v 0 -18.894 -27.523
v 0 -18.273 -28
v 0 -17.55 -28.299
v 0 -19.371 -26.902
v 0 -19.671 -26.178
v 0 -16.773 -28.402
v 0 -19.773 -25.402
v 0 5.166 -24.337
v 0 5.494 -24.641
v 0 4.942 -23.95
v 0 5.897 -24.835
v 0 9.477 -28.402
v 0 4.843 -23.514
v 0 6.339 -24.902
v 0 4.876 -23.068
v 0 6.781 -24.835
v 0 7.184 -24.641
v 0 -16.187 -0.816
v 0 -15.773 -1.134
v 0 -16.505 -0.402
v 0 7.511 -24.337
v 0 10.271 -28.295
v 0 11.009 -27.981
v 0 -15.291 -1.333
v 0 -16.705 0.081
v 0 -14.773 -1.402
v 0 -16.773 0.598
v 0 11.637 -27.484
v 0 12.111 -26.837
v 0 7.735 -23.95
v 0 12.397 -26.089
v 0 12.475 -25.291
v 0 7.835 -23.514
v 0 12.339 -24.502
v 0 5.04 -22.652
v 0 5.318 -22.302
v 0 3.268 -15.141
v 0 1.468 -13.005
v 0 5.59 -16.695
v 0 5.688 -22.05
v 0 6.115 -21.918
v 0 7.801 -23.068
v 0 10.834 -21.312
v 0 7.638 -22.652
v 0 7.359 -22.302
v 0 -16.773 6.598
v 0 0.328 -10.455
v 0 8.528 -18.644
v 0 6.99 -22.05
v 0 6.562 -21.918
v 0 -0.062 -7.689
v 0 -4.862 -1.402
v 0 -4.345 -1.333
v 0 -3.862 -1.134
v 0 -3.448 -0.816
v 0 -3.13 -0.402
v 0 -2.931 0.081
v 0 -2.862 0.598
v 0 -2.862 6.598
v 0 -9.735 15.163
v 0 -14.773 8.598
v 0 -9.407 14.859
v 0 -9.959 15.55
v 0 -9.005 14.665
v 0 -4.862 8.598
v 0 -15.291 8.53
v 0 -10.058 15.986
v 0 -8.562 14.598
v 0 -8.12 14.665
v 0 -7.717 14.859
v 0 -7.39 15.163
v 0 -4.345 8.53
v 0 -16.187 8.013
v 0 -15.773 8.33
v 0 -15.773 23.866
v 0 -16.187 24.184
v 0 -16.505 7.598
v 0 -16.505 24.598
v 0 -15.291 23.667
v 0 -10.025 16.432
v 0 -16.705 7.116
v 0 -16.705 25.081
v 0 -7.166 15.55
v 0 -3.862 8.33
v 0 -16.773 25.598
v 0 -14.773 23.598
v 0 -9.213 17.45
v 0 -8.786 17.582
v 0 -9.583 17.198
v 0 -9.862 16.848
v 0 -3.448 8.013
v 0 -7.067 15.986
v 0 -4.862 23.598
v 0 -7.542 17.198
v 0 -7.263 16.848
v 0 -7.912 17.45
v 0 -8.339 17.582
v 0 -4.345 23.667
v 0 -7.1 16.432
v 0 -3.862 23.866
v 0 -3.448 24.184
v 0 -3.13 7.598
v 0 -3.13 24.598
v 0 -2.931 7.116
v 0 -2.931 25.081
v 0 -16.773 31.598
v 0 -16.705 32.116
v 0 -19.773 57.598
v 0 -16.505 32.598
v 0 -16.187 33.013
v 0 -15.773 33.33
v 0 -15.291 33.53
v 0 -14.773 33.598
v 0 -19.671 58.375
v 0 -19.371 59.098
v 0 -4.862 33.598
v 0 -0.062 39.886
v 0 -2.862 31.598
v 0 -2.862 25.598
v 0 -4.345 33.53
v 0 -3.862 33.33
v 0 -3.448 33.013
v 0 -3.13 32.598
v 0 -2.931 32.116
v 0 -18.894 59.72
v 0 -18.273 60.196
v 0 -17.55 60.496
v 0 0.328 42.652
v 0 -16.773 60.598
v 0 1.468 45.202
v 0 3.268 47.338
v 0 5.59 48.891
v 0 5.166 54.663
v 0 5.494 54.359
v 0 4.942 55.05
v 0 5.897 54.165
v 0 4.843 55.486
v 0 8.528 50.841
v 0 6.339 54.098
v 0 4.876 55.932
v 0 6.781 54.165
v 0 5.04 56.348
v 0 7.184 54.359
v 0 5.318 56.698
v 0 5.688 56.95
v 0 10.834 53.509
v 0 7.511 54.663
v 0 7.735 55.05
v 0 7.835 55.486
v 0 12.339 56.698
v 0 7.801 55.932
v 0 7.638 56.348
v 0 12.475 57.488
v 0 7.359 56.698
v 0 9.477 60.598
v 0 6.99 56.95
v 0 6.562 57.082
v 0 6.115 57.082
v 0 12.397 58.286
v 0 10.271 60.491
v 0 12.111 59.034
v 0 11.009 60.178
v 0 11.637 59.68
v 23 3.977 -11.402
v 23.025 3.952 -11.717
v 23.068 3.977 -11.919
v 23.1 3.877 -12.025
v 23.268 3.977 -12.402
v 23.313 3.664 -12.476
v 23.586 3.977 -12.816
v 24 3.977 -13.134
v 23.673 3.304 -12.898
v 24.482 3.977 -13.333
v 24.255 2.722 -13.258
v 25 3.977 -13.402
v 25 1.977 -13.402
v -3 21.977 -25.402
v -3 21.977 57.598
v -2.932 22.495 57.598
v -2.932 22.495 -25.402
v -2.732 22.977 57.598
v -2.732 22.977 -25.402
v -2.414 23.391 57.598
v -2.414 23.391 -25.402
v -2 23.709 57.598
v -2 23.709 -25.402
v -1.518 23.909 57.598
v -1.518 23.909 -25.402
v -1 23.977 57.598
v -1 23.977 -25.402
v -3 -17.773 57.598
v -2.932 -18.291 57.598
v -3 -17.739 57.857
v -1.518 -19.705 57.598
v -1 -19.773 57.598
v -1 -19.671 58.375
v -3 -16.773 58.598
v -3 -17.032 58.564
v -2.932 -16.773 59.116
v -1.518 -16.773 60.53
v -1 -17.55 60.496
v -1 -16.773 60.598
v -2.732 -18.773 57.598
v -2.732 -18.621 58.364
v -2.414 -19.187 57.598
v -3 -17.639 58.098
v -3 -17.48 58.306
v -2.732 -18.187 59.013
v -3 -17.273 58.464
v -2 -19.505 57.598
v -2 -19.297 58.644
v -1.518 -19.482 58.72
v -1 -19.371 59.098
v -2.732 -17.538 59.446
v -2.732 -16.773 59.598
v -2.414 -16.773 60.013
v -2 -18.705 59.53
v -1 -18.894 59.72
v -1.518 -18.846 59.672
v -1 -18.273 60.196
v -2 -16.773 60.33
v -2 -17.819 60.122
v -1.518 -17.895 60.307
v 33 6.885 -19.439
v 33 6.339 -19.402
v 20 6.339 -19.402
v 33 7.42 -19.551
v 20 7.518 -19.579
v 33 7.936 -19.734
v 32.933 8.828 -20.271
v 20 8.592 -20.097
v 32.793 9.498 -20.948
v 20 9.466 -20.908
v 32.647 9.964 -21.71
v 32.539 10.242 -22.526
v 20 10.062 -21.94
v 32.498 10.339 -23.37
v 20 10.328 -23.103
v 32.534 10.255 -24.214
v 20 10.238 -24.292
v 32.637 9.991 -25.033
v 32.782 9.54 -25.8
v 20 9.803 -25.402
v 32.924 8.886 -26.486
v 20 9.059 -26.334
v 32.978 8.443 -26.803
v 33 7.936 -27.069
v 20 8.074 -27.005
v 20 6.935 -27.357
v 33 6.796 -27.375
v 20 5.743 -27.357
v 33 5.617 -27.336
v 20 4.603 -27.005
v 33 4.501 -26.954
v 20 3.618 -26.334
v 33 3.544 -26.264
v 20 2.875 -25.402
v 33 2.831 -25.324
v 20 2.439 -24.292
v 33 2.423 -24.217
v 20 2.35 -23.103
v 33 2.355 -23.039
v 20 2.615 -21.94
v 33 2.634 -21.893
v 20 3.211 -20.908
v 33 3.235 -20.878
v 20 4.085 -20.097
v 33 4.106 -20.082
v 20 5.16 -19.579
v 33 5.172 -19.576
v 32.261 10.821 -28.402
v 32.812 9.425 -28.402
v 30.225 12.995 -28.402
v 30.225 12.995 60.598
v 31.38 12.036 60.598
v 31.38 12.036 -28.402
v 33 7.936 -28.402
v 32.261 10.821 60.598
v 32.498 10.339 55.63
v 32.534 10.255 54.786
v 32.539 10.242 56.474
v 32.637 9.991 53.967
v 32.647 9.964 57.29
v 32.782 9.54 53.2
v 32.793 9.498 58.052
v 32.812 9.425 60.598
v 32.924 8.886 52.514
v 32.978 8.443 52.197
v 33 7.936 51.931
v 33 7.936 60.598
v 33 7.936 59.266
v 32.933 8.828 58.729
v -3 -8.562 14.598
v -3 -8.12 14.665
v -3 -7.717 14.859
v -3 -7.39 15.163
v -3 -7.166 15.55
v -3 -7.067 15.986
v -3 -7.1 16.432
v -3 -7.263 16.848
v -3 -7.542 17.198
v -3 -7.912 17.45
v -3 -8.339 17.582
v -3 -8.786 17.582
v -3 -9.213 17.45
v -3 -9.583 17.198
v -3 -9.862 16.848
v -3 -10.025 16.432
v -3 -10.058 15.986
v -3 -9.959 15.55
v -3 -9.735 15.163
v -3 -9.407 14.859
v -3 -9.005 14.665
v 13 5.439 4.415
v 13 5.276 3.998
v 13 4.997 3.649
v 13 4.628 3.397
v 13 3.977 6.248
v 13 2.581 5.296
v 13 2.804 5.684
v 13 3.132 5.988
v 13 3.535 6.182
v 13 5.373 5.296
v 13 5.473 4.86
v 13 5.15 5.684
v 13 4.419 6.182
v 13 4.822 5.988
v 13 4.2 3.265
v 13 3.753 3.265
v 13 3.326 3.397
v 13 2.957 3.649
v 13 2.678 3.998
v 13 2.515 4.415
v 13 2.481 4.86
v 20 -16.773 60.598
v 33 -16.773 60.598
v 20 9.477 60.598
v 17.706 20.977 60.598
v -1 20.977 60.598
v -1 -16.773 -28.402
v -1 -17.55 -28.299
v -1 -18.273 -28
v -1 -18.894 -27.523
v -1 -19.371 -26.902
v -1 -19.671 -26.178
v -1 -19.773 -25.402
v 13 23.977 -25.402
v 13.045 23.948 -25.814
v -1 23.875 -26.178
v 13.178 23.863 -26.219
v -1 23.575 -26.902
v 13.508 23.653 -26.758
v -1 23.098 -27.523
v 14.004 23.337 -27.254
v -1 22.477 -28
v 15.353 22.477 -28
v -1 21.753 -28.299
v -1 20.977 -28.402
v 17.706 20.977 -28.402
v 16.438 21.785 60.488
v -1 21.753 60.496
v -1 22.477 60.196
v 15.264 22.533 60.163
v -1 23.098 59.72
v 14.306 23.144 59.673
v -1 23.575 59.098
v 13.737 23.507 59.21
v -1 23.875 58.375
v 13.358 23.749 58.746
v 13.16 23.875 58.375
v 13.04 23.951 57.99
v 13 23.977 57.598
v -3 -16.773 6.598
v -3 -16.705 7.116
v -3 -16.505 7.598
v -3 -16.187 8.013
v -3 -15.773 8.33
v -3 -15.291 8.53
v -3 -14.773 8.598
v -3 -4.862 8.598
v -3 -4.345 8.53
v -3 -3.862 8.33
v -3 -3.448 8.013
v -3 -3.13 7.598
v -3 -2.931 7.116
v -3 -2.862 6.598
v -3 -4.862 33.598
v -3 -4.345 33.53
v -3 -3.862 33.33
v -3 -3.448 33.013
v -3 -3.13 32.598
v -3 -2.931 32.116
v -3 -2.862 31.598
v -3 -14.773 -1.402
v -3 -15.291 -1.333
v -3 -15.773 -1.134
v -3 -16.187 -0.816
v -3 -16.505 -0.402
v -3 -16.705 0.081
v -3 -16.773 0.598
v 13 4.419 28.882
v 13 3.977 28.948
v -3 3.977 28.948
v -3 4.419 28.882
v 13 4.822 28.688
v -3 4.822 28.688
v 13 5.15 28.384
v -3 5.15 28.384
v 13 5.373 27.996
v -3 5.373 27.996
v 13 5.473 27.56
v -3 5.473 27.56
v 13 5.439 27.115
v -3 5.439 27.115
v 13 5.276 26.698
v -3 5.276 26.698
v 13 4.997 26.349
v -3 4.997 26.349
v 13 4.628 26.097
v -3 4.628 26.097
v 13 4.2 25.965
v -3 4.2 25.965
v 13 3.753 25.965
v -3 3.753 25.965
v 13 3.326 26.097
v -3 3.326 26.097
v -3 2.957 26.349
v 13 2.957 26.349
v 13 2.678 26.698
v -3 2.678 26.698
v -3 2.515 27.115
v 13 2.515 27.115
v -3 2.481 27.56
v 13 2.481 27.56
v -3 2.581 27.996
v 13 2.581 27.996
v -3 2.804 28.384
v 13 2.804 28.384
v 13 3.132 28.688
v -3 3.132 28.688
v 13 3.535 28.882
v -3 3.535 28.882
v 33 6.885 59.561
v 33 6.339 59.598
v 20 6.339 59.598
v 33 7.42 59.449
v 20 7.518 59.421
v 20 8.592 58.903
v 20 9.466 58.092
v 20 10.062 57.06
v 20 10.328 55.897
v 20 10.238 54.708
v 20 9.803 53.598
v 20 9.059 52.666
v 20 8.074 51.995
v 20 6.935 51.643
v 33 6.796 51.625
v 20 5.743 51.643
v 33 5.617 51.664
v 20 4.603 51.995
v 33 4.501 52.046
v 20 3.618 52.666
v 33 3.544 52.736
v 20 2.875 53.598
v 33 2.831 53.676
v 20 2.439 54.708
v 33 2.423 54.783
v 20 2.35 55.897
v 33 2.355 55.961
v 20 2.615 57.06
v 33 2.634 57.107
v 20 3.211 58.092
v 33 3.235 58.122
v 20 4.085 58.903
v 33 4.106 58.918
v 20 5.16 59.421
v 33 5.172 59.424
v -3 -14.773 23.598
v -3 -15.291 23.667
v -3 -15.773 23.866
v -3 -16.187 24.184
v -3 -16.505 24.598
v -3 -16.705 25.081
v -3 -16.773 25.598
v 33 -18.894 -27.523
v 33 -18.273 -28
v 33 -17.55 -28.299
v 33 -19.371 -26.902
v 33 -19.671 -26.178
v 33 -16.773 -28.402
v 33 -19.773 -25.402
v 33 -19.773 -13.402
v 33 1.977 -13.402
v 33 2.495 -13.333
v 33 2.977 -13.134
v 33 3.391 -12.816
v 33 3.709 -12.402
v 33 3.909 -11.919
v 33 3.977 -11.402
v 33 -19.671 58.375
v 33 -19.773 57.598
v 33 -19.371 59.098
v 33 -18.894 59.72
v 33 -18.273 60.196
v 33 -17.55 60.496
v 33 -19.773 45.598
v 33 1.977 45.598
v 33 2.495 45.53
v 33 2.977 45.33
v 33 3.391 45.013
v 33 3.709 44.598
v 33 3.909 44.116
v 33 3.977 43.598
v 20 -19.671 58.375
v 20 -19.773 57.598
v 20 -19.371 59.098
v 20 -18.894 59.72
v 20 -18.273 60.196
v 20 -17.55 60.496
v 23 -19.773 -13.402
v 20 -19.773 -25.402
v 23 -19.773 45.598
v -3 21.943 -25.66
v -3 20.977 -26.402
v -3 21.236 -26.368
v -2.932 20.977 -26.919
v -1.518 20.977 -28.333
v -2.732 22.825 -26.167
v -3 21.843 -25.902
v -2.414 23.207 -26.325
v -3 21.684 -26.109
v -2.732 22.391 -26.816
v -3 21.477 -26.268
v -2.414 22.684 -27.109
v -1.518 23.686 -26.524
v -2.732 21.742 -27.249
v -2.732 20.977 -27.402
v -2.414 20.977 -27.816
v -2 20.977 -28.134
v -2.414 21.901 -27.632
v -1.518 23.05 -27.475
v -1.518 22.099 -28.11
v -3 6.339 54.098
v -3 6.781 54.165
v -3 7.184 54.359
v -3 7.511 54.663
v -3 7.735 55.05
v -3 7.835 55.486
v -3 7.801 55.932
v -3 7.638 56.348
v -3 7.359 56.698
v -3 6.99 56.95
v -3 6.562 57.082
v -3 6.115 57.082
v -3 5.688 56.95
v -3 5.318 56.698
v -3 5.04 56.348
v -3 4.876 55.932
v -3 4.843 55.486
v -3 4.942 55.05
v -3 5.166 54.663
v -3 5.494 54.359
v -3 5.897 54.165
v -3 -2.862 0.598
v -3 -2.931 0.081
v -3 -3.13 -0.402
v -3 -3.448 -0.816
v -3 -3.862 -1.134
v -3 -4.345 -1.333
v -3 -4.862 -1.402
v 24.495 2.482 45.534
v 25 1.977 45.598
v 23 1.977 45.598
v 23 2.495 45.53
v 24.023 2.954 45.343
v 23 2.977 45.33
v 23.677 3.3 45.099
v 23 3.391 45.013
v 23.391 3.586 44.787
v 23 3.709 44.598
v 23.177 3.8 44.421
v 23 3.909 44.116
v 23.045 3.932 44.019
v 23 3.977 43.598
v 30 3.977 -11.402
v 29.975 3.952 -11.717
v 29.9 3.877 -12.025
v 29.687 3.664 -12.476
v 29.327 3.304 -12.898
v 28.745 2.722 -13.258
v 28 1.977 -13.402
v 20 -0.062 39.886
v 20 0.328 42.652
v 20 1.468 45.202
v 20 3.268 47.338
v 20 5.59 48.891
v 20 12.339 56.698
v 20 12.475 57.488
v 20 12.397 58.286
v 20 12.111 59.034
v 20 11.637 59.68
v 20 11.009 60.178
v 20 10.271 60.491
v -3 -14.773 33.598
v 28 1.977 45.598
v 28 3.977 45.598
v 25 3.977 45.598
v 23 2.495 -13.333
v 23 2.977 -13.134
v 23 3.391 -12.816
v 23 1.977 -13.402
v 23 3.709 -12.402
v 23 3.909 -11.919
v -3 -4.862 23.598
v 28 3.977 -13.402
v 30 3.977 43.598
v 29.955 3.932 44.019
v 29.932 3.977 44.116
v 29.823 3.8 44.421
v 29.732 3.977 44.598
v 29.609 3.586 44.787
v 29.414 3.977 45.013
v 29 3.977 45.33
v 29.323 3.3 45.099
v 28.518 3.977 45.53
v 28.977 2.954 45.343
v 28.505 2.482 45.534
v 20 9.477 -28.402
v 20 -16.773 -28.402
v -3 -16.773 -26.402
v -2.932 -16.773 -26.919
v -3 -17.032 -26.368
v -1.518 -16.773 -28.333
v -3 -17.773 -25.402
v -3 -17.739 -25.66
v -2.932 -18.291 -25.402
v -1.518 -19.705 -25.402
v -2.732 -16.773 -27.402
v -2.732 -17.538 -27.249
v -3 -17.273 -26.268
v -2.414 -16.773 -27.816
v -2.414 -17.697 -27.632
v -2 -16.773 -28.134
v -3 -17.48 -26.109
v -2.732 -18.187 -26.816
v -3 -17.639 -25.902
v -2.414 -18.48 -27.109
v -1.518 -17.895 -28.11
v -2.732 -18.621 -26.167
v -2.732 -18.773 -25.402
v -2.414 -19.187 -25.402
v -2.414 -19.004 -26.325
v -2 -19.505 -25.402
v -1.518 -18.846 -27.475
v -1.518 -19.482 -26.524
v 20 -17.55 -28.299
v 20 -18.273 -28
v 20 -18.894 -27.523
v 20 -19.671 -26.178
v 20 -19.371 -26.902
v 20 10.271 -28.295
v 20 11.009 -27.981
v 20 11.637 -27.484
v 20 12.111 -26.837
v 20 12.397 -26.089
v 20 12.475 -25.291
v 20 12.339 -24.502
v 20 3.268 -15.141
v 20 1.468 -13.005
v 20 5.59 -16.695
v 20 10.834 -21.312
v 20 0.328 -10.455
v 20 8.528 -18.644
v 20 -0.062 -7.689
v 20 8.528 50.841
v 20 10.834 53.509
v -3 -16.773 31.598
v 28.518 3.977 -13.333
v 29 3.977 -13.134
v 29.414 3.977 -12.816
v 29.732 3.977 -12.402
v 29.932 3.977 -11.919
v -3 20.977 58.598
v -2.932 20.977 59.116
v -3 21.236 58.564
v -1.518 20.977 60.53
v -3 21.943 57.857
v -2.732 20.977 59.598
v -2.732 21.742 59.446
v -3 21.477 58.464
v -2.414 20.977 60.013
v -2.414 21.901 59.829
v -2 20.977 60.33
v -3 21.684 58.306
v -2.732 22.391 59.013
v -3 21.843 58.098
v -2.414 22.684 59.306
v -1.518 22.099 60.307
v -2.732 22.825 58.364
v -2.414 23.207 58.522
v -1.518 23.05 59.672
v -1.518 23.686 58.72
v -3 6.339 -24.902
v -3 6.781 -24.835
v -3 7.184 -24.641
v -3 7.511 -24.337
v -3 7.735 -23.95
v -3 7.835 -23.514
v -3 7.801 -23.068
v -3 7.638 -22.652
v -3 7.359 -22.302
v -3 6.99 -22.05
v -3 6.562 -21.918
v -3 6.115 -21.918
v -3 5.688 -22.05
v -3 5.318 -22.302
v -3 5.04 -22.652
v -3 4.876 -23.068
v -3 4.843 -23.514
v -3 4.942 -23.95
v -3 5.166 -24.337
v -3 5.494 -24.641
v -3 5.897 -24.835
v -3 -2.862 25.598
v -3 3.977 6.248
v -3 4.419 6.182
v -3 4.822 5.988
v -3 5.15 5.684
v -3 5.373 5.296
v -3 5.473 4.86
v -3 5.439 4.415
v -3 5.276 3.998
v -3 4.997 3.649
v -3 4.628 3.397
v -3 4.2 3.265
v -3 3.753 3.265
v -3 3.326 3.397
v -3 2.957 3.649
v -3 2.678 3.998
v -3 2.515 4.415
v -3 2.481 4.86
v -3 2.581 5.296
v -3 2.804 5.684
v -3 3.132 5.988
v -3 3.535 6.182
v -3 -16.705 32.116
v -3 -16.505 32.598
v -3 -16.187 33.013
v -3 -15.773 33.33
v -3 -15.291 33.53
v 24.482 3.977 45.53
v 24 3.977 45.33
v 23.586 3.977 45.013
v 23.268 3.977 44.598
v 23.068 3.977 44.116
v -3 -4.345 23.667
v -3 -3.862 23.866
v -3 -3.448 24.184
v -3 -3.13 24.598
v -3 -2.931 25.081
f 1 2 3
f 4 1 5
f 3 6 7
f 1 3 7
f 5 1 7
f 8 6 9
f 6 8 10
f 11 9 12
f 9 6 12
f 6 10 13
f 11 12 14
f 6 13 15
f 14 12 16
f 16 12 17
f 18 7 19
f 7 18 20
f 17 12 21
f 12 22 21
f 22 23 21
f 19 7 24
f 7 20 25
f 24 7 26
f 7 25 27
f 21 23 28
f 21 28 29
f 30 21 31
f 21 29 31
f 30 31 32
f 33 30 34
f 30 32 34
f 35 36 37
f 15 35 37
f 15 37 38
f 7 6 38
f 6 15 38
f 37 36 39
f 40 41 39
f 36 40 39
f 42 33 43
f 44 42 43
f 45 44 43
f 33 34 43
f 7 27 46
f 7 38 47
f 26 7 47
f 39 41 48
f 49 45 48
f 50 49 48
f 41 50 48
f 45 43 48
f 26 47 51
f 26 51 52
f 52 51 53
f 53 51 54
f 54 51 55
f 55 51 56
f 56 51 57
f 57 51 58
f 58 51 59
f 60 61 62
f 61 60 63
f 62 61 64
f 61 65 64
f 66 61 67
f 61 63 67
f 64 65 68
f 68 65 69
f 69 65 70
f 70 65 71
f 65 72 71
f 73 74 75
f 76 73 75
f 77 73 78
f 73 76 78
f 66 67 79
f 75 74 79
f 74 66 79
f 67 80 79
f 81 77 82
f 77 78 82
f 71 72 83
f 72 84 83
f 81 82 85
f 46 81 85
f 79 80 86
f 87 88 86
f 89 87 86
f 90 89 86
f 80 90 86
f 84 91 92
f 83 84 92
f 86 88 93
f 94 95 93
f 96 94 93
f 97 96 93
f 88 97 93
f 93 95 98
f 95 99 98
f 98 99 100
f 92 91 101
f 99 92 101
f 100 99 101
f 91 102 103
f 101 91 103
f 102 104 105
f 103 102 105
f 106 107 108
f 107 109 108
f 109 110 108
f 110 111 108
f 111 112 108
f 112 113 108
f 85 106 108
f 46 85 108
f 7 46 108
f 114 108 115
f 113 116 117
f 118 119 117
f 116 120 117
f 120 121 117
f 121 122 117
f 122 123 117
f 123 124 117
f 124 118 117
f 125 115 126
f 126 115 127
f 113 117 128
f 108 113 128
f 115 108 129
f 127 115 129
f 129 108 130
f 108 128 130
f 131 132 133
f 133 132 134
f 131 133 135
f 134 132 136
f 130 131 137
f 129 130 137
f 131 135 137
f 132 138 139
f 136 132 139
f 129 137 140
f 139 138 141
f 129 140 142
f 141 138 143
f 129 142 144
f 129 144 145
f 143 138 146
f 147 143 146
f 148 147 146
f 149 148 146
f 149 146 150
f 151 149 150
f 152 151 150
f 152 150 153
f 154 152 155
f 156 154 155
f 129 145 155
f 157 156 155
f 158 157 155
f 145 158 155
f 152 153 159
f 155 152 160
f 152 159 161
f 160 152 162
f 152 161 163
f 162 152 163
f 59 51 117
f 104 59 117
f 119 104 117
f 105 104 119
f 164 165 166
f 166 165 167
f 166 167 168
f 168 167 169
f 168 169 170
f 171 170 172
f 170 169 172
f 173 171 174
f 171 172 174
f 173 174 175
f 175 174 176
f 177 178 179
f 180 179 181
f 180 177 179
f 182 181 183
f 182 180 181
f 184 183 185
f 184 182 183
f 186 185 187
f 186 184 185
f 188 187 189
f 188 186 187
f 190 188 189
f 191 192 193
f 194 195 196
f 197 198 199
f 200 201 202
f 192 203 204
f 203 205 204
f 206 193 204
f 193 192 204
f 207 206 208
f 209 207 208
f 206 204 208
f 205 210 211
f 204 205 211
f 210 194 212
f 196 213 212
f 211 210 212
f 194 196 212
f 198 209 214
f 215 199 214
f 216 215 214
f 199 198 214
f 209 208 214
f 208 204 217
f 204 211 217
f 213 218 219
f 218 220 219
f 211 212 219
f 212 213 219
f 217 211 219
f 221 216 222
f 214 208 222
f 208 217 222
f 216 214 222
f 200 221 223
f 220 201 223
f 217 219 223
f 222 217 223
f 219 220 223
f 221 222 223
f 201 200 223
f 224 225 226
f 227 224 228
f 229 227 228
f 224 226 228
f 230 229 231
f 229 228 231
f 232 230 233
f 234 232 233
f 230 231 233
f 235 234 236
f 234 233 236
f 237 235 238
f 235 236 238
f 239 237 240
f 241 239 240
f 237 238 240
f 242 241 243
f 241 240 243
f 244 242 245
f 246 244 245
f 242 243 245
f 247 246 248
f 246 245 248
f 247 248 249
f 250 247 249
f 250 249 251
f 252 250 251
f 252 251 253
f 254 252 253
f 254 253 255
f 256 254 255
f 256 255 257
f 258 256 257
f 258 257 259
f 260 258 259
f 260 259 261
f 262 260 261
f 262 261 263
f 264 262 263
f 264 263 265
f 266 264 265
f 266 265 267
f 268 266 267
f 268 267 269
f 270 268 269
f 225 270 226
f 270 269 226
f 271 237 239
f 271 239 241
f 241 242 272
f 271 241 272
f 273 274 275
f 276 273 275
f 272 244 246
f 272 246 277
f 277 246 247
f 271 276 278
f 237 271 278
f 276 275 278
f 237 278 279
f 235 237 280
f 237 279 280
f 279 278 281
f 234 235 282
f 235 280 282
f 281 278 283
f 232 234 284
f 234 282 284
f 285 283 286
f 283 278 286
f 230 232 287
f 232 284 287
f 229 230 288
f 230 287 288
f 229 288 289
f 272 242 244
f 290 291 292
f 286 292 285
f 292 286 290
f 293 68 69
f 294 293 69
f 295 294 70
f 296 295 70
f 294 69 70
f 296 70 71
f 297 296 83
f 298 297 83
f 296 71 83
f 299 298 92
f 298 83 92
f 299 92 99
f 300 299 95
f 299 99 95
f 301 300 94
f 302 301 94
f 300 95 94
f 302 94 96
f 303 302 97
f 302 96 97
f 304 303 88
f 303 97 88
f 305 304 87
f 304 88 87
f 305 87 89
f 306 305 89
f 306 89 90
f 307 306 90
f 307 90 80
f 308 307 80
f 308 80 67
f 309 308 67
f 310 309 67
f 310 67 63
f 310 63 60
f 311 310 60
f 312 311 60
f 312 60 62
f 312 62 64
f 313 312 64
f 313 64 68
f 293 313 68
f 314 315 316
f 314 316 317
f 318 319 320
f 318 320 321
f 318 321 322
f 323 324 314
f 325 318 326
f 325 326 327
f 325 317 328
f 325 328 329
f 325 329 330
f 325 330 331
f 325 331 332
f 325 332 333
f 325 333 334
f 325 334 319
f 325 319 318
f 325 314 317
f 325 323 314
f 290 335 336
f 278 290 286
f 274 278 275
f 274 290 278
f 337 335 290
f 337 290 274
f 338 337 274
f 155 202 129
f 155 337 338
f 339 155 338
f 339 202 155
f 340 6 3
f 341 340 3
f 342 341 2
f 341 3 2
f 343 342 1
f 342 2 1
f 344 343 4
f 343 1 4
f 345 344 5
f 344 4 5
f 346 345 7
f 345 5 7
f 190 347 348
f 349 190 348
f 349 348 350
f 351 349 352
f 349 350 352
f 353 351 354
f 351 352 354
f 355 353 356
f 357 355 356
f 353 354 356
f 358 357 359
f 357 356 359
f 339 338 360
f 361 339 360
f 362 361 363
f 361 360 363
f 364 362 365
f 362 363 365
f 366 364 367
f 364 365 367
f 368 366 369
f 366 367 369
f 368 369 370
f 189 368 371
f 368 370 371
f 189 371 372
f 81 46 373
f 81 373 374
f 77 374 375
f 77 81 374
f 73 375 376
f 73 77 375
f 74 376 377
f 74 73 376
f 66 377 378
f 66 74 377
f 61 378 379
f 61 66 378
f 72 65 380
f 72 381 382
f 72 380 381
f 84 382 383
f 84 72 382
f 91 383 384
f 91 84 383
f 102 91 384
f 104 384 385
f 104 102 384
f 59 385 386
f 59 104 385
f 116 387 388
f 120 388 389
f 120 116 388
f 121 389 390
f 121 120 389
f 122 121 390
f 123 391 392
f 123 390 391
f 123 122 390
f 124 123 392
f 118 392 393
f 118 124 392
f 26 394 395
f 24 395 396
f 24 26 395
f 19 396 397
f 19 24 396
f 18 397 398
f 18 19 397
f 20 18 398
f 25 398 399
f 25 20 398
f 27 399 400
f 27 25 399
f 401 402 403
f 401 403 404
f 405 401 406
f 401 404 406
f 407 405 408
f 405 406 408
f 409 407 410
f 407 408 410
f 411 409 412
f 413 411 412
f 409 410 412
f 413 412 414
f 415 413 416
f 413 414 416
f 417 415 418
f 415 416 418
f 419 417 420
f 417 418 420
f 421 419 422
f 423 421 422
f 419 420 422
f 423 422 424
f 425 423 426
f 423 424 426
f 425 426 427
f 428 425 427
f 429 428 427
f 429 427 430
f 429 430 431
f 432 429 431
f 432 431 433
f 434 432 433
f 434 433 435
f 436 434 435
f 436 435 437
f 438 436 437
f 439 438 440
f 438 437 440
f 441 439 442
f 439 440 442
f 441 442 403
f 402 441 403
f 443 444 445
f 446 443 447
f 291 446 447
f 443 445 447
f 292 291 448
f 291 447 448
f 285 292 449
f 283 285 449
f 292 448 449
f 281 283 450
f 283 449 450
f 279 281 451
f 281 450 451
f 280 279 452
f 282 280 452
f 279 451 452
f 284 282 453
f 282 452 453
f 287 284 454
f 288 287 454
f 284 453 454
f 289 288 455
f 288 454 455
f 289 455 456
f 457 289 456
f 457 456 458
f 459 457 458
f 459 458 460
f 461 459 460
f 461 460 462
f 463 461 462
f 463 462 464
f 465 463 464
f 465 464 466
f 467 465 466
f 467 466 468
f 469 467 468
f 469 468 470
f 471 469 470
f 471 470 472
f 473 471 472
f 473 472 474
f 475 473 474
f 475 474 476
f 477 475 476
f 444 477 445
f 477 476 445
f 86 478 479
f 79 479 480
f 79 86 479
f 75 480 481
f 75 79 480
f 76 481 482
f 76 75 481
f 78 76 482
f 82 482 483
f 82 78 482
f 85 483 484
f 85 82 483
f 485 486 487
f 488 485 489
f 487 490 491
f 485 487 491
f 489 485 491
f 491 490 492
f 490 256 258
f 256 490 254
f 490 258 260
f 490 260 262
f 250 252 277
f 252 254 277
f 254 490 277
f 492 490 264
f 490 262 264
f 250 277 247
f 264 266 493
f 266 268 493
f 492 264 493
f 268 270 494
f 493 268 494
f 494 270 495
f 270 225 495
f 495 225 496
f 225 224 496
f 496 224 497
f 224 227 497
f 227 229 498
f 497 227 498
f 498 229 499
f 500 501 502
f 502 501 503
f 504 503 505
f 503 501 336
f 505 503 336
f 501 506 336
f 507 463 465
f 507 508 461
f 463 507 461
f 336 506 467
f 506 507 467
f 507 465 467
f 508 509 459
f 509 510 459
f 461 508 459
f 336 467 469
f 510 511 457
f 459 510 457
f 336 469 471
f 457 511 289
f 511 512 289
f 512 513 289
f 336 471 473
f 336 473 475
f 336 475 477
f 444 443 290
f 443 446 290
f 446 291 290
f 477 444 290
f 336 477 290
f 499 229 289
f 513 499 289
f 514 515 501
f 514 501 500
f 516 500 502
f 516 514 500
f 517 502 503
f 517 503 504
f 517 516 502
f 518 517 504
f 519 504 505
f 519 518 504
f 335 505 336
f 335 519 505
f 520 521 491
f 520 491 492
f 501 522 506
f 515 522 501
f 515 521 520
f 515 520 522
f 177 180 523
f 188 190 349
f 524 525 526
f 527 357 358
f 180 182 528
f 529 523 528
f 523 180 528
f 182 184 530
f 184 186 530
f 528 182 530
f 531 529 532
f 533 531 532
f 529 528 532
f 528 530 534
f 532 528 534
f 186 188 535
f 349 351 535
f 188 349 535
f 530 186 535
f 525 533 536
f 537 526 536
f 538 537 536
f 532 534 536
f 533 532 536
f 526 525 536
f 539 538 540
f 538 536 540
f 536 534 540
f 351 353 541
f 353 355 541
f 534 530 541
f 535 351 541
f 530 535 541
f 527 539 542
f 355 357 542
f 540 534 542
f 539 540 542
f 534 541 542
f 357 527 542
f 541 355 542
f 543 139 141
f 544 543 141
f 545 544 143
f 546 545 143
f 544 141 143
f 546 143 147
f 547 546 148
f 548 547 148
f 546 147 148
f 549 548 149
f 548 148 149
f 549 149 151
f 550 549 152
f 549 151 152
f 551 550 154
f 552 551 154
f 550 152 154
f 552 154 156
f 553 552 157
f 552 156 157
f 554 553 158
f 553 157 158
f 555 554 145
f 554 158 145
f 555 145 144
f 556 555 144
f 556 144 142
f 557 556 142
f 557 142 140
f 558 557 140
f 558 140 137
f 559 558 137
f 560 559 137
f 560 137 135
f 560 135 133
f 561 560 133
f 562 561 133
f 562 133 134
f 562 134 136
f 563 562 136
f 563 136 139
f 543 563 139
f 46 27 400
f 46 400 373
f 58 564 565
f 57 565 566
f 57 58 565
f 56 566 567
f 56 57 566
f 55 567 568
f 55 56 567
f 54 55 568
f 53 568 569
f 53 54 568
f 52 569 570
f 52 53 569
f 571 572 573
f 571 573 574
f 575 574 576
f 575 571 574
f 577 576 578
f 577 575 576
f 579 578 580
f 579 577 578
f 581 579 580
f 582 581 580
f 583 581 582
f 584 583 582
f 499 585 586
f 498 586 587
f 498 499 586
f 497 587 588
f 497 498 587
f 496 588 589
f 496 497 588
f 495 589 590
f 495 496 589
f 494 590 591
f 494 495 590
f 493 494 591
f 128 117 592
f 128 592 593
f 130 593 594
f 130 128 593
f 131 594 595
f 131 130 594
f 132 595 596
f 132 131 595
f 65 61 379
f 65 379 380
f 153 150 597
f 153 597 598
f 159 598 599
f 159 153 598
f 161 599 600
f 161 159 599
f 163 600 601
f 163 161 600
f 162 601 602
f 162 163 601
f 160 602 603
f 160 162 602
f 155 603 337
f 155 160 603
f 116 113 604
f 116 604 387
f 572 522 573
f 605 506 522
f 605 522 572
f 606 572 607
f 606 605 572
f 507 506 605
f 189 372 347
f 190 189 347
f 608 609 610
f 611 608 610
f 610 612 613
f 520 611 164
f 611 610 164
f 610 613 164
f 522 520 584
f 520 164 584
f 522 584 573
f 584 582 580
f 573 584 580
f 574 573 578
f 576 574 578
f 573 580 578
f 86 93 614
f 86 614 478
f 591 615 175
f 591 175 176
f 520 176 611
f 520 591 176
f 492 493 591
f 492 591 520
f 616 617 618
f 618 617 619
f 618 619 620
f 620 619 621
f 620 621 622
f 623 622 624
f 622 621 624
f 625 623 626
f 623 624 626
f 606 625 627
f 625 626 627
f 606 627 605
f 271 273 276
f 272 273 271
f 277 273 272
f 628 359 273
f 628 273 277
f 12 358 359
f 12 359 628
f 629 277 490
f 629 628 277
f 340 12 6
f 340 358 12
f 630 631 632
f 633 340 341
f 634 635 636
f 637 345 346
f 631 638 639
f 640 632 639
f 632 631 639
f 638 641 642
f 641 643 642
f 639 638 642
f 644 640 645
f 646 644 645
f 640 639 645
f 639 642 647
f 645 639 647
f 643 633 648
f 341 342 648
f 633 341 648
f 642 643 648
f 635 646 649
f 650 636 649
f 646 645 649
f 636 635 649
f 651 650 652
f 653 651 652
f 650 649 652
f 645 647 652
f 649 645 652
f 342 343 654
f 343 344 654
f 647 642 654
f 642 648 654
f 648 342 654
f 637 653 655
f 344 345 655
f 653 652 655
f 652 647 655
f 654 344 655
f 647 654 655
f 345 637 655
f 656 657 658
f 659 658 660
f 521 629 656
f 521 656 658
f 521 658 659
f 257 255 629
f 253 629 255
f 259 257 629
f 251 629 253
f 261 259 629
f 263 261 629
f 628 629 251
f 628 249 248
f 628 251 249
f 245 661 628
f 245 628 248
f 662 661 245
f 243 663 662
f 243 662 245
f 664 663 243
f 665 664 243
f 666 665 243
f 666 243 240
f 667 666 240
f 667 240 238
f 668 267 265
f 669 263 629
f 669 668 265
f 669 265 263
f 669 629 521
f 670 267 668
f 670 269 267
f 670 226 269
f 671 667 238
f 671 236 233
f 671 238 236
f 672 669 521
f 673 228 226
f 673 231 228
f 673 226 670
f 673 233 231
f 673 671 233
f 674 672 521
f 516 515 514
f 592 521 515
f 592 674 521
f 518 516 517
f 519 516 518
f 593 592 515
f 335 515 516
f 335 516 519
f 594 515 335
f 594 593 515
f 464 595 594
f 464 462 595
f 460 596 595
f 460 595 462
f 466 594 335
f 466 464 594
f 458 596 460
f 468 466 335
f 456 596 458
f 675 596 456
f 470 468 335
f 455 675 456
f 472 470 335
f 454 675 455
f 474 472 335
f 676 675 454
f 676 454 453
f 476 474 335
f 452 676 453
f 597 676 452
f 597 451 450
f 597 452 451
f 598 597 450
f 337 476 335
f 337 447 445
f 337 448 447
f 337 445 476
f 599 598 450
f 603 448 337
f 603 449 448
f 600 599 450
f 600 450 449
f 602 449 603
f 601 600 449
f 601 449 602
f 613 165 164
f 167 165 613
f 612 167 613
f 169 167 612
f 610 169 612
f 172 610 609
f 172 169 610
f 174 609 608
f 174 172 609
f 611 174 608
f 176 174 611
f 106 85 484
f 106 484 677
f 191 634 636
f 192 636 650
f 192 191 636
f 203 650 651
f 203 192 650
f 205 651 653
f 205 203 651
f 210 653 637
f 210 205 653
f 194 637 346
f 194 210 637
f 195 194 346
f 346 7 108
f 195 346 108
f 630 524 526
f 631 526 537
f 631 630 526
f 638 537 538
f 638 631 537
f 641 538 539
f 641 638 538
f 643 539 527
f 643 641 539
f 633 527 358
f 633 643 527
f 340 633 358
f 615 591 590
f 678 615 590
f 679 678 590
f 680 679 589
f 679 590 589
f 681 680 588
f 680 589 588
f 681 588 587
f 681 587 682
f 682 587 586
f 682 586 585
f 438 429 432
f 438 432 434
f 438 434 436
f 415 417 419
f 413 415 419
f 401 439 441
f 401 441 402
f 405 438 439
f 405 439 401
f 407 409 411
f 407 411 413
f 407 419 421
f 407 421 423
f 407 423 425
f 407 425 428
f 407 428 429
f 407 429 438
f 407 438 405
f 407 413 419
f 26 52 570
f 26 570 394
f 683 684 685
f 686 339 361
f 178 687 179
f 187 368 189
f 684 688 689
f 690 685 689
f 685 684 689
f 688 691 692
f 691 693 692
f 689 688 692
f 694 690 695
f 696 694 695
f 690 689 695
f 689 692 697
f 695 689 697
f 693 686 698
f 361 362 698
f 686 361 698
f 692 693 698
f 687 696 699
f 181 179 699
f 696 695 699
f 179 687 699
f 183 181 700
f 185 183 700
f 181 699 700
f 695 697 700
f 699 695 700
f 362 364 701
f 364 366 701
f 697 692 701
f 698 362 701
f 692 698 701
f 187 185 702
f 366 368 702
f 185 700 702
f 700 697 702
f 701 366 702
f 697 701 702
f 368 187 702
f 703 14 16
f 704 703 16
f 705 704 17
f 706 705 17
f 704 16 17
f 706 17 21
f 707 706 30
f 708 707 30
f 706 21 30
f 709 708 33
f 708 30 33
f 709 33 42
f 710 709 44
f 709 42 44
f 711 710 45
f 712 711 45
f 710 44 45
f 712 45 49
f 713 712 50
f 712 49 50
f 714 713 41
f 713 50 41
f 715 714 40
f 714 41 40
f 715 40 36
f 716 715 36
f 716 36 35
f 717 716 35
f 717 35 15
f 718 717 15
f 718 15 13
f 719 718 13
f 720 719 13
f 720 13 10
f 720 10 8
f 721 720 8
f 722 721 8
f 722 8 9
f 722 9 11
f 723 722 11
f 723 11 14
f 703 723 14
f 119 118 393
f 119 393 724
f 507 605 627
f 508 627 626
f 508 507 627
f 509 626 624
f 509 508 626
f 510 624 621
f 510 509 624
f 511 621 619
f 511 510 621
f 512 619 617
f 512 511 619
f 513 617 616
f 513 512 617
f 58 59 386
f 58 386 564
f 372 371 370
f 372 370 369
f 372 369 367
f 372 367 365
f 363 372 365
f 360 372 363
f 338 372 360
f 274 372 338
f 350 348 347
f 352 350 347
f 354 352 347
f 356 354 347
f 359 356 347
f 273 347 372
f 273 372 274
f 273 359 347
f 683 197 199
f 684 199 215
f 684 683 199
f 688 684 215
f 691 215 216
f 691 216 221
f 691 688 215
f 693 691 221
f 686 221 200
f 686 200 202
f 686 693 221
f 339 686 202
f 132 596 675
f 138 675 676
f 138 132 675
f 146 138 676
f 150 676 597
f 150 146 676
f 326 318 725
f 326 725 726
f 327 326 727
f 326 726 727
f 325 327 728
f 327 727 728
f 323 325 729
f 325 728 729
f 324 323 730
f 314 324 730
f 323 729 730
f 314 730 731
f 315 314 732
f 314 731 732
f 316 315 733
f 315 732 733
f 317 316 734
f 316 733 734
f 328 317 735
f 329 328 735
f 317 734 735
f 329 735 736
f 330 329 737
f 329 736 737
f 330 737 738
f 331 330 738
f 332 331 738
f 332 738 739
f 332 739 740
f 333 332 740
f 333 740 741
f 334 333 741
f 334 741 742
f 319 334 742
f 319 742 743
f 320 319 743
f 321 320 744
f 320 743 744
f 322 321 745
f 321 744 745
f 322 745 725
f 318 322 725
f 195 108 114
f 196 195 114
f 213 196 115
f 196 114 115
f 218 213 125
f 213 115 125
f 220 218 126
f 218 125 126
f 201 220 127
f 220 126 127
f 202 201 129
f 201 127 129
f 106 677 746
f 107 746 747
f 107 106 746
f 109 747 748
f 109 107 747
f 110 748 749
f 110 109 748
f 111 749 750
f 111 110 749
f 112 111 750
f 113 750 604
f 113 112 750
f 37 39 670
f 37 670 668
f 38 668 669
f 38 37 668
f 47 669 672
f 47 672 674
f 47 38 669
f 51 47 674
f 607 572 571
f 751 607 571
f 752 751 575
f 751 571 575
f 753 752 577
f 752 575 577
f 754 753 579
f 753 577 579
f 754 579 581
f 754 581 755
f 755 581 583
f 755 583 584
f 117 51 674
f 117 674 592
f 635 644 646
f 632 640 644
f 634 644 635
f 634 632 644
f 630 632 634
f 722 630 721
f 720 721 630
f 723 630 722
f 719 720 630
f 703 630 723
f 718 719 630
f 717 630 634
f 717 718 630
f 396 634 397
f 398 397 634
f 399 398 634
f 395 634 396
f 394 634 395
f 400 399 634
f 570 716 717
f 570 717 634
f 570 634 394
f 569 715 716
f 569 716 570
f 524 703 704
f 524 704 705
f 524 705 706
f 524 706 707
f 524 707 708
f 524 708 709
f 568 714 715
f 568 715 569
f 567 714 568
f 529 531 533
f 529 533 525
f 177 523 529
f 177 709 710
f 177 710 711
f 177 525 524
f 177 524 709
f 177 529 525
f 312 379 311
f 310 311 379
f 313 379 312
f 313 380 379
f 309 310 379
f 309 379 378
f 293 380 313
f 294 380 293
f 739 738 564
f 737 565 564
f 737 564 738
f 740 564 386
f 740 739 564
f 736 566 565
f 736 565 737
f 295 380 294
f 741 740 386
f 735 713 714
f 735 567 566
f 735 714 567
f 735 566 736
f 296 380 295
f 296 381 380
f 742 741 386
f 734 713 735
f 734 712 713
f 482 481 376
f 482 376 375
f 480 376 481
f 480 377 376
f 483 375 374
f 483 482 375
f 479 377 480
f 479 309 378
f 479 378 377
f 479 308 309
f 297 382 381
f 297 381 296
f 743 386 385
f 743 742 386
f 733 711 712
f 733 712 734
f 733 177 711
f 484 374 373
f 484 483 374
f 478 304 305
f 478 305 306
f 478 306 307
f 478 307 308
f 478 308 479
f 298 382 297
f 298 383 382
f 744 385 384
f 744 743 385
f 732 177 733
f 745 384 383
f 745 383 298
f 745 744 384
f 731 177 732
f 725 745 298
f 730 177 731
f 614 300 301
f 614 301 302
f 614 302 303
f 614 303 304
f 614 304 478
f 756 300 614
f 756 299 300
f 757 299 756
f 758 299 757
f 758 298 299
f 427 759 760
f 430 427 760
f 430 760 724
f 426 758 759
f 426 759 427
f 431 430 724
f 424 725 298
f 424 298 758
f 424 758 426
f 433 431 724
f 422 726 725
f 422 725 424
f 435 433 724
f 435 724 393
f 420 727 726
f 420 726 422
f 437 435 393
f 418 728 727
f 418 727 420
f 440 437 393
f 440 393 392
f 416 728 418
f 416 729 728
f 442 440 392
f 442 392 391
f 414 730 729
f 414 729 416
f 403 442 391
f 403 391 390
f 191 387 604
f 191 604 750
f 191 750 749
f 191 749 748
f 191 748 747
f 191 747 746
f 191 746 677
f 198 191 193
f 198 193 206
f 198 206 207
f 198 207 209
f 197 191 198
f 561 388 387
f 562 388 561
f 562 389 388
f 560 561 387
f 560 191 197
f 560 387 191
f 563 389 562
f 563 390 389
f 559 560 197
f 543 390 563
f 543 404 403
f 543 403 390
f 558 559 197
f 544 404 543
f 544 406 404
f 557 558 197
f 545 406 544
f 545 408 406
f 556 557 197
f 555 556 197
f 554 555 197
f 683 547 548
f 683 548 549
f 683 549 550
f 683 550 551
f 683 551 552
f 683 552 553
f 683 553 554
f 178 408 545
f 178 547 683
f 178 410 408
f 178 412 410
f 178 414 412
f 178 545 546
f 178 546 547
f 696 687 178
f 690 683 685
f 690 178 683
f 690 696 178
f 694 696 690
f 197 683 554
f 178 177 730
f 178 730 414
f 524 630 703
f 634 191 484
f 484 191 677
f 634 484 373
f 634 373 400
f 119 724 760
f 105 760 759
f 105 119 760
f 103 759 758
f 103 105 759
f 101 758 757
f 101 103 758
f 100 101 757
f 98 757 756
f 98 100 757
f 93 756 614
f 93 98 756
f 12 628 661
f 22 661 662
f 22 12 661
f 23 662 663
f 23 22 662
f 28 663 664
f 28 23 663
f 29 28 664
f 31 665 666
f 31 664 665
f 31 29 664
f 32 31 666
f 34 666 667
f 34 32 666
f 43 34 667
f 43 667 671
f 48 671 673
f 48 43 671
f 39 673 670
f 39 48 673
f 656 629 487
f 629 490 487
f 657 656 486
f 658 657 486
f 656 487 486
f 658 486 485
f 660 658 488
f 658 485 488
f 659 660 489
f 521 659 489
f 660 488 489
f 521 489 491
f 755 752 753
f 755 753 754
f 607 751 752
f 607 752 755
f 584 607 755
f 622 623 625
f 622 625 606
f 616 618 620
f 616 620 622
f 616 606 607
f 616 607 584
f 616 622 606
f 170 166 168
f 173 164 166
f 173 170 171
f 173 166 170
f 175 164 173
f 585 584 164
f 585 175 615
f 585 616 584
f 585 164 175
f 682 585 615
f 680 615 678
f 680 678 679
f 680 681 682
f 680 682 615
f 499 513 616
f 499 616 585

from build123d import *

# Parameters (mm, degrees)
RESSALTO_EXTRUS_O2_DEPTH      = 30
RESSALTO_EXTRUS_O3_DEPTH      = 3
RESSALTO_EXTRUS_O4_DEPTH      = 3
RESSALTO_EXTRUS_O4_DEPTH_BACK = 10
CORTE_EXTRUS_O1_DEPTH         = 10
CORTE_EXTRUS_O2_DEPTH         = 23.75
ESBO_O10_R                    = 1.5
CORTE_EXTRUS_O3_DEPTH         = 10
CORTE_EXTRUS_O4_DEPTH         = 10
FILETE2_R                     = 2
ESBO_O13_R                    = 1.5
CORTE_EXTRUS_O5_DEPTH         = 16
CORTE_EXTRUS_O11_DEPTH        = 117
FILETE7_R                     = 6
ESBO_O18_R                    = 4
CORTE_EXTRUS_O13_DEPTH        = 22
ESBO_O19_R                    = 4
CORTE_EXTRUS_O14_DEPTH        = 22


with BuildPart() as part:
    # Esboço2 → Ressalto-extrusão2 (new body)
    with BuildSketch(Plane(origin=(0, 0, 0), x_dir=(0, 0, -1), z_dir=(1, 0, 0))):
        with BuildLine():
            Line((2.90159992, -0.062465938), (-35.09840008, -0.062465938))
            Line((-35.09840008, -0.062465938), (-39.886084903, -0.062465938))
            ThreePointArc((-39.886084903, -0.062465938), (-45.202180234, 1.467638524), (-48.891439328, 5.589707975))
            ThreePointArc((-48.891439328, 5.589707975), (-52.096536948, 9.772081499), (-56.69840008, 12.338743681))
            ThreePointArc((-56.69840008, 12.338743681), (-59.373224015, 11.895603401), (-60.59840008, 9.476926077))
            Line((-60.59840008, 9.476926077), (-60.59840008, 20.976926077))
            ThreePointArc((-60.59840008, 20.976926077), (-59.719720424, 23.09824642), (-57.59840008, 23.976926077))
            Line((-57.59840008, 23.976926077), (25.40159992, 23.976926077))
            ThreePointArc((25.40159992, 23.976926077), (27.522920263, 23.09824642), (28.40159992, 20.976926077))
            Line((28.40159992, 20.976926077), (28.40159992, 9.476926077))
            ThreePointArc((28.40159992, 9.476926077), (27.176423855, 11.895603401), (24.50159992, 12.338743681))
            ThreePointArc((24.50159992, 12.338743681), (19.899736788, 9.772081499), (16.694639168, 5.589707975))
            ThreePointArc((16.694639168, 5.589707975), (13.005380073, 1.467638524), (7.689284743, -0.062465938))
            Line((7.689284743, -0.062465938), (2.90159992, -0.062465938))
        make_face()
    extrude(amount=RESSALTO_EXTRUS_O2_DEPTH)

    # Esboço3 → Ressalto-extrusão3 (add)
    with BuildSketch(Plane.ZY):
        with BuildLine():
            Line((60.59840008, 15.226926077), (60.59840008, 20.976926077))
            ThreePointArc((60.59840008, 20.976926077), (59.719720424, 23.09824642), (57.59840008, 23.976926077))
            Line((57.59840008, 23.976926077), (16.09840008, 23.976926077))
            Line((16.09840008, 23.976926077), (-25.40159992, 23.976926077))
            ThreePointArc((-25.40159992, 23.976926077), (-27.522920263, 23.09824642), (-28.40159992, 20.976926077))
            Line((-28.40159992, 20.976926077), (-28.40159992, 15.226926077))
            Line((-28.40159992, 15.226926077), (-28.40159992, -16.773073923))
            ThreePointArc((-28.40159992, -16.773073923), (-27.522920263, -18.894394267), (-25.40159992, -19.773073923))
            Line((-25.40159992, -19.773073923), (57.59840008, -19.773073923))
            ThreePointArc((57.59840008, -19.773073923), (59.719720424, -18.894394267), (60.59840008, -16.773073923))
            Line((60.59840008, -16.773073923), (60.59840008, 15.226926077))
        make_face()
    extrude(amount=RESSALTO_EXTRUS_O3_DEPTH)

    # Esboço4 → Ressalto-extrusão4 (add, two sides)
    with BuildSketch(Plane(origin=(30, 0, 0), x_dir=(0, 0, -1), z_dir=(1, 0, 0))) as ressalto_extrus_o4_sk:
        with BuildLine():
            Line((-16.09840008, 23.976926077), (25.40159992, 23.976926077))
            ThreePointArc((25.40159992, 23.976926077), (27.522920263, 23.09824642), (28.40159992, 20.976926077))
            Line((28.40159992, 20.976926077), (28.40159992, 15.226926077))
            Line((28.40159992, 15.226926077), (28.40159992, -16.773073923))
            ThreePointArc((28.40159992, -16.773073923), (27.522920263, -18.894394267), (25.40159992, -19.773073923))
            Line((25.40159992, -19.773073923), (-57.59840008, -19.773073923))
            ThreePointArc((-57.59840008, -19.773073923), (-59.719720424, -18.894394267), (-60.59840008, -16.773073923))
            Line((-60.59840008, -16.773073923), (-60.59840008, 15.226926077))
            Line((-60.59840008, 15.226926077), (-60.59840008, 20.976926077))
            ThreePointArc((-60.59840008, 20.976926077), (-59.719720424, 23.09824642), (-57.59840008, 23.976926077))
            Line((-57.59840008, 23.976926077), (-16.09840008, 23.976926077))
        make_face()
    extrude(amount=RESSALTO_EXTRUS_O4_DEPTH)
    extrude(ressalto_extrus_o4_sk.sketch, amount=-RESSALTO_EXTRUS_O4_DEPTH_BACK)

    # Esboço8 → Corte-extrusão1 (cut)
    with BuildSketch(Plane(origin=(33, 0, 0), x_dir=(0, 0, -1), z_dir=(1, 0, 0))):
        with BuildLine():
            Line((-43.59840008, 3.976926077), (11.40159992, 3.976926077))
            ThreePointArc((11.40159992, 3.976926077), (12.815813482, 3.391139639), (13.40159992, 1.976926077))
            Line((13.40159992, 1.976926077), (13.40159992, -7.773073923))
            Line((13.40159992, -7.773073923), (13.40159992, -19.773073923))
            Line((13.40159992, -19.773073923), (-45.59840008, -19.773073923))
            Line((-45.59840008, -19.773073923), (-45.59840008, -7.773073923))
            Line((-45.59840008, -7.773073923), (-45.59840008, 1.976926077))
            ThreePointArc((-45.59840008, 1.976926077), (-45.012613643, 3.391139639), (-43.59840008, 3.976926077))
        make_face()
    extrude(amount=-CORTE_EXTRUS_O1_DEPTH, mode=Mode.SUBTRACT)

    # Esboço9 → Corte-extrusão2 (cut)
    with BuildSketch(Plane(origin=(0, -19.773073923, 0), x_dir=(-1, 0, 0), z_dir=(0, -1, 0))):
        with BuildLine():
            Line((-25, 13.40159992), (-28, 13.40159992))
            ThreePointArc((-28, 13.40159992), (-29.414213562, 12.815813482), (-30, 11.40159992))
            Line((-30, 11.40159992), (-30, -43.59840008))
            ThreePointArc((-30, -43.59840008), (-29.414213562, -45.012613643), (-28, -45.59840008))
            Line((-28, -45.59840008), (-25, -45.59840008))
            ThreePointArc((-25, -45.59840008), (-23.585786438, -45.012613643), (-23, -43.59840008))
            Line((-23, -43.59840008), (-23, 11.40159992))
            ThreePointArc((-23, 11.40159992), (-23.585786438, 12.815813482), (-25, 13.40159992))
        make_face()
    extrude(amount=-CORTE_EXTRUS_O2_DEPTH, mode=Mode.SUBTRACT)

    # Esboço10 → Corte-extrusão3 (cut)
    with BuildSketch(Plane(origin=(0, 0, 0), x_dir=(0, 0, -1), z_dir=(1, 0, 0))):
        with Locations((-55.59840008, 6.338743681)):
            Circle(ESBO_O10_R)
        with Locations((23.40159992, 6.338743681)):
            Circle(ESBO_O10_R)
        with Locations((-16.09840008, -8.562465938)):
            Circle(ESBO_O10_R)
    extrude(amount=-CORTE_EXTRUS_O3_DEPTH, mode=Mode.SUBTRACT)

    # Esboço12 → Corte-extrusão4 (cut)
    with BuildSketch(Plane(origin=(0, 0, 0), x_dir=(0, 0, -1), z_dir=(1, 0, 0))):
        with BuildLine():
            Line((-31.59840008, -2.862465938), (-25.59840008, -2.862465938))
            ThreePointArc((-25.59840008, -2.862465938), (-24.184186518, -3.448252375), (-23.59840008, -4.862465938))
            Line((-23.59840008, -4.862465938), (-23.59840008, -14.773073923))
            ThreePointArc((-23.59840008, -14.773073923), (-24.184186518, -16.187287486), (-25.59840008, -16.773073923))
            Line((-25.59840008, -16.773073923), (-31.59840008, -16.773073923))
            ThreePointArc((-31.59840008, -16.773073923), (-33.012613643, -16.187287486), (-33.59840008, -14.773073923))
            Line((-33.59840008, -14.773073923), (-33.59840008, -4.862465938))
            ThreePointArc((-33.59840008, -4.862465938), (-33.012613643, -3.448252375), (-31.59840008, -2.862465938))
        make_face()
        with BuildLine():
            Line((-6.59840008, -2.862465938), (-0.59840008, -2.862465938))
            ThreePointArc((-0.59840008, -2.862465938), (0.815813482, -3.448252375), (1.40159992, -4.862465938))
            Line((1.40159992, -4.862465938), (1.40159992, -14.773073923))
            ThreePointArc((1.40159992, -14.773073923), (0.815813482, -16.187287486), (-0.59840008, -16.773073923))
            Line((-0.59840008, -16.773073923), (-6.59840008, -16.773073923))
            ThreePointArc((-6.59840008, -16.773073923), (-8.012613643, -16.187287486), (-8.59840008, -14.773073923))
            Line((-8.59840008, -14.773073923), (-8.59840008, -4.862465938))
            ThreePointArc((-8.59840008, -4.862465938), (-8.012613643, -3.448252375), (-6.59840008, -2.862465938))
        make_face()
    extrude(amount=-CORTE_EXTRUS_O4_DEPTH, mode=Mode.SUBTRACT)

    # Filete2
    filete2_edges = [part.edges().sort_by_distance(p)[0] for p in [
        (-3, 2.101926077, 60.59840008),
        (-3, 23.09824642, 59.719720424),
        (-3, 23.976926077, 16.09840008),
        (-3, 23.09824642, -27.522920263),
        (-3, 2.101926077, -28.40159992),
        (-3, -18.894394267, -27.522920263),
        (-3, -19.773073923, 16.09840008),
        (-3, -18.894394267, 59.719720424),
    ]]
    fillet(filete2_edges, radius=FILETE2_R)

    # Esboço13 → Corte-extrusão5 (cut)
    with BuildSketch(Plane.ZY.offset(3)):
        with Locations((27.44840008, 3.976926077)):
            Circle(ESBO_O13_R)
        with Locations((4.74840008, 3.976926077)):
            Circle(ESBO_O13_R)
    extrude(amount=-CORTE_EXTRUS_O5_DEPTH, mode=Mode.SUBTRACT)

    # Esboço16 → Corte-extrusão11 (cut)
    with BuildSketch(Plane(origin=(0, 0, -38.40159992), x_dir=(-1, 0, 0), z_dir=(0, 0, -1))):
        Polygon((-13, 23.976926077), (-33, 11.226201247), (-33, 23.976926077), align=None)
    extrude(amount=-CORTE_EXTRUS_O11_DEPTH, mode=Mode.SUBTRACT)

    # Filete7
    filete7_edges = [part.edges().sort_by_distance(p)[0] for p in [
        (33, 11.226201247, 16.09840008),
    ]]
    fillet(filete7_edges, radius=FILETE7_R)

    # Esboço18 → Corte-extrusão13 (cut)
    with BuildSketch(Plane.ZY.offset(-20)):
        with Locations((-23.40159992, 6.338743681)):
            Circle(ESBO_O18_R)
    extrude(amount=-CORTE_EXTRUS_O13_DEPTH, mode=Mode.SUBTRACT)

    # Esboço19 → Corte-extrusão14 (cut)
    with BuildSketch(Plane.ZY.offset(-20)):
        with Locations((55.59840008, 6.338743681)):
            Circle(ESBO_O19_R)
    extrude(amount=-CORTE_EXTRUS_O14_DEPTH, mode=Mode.SUBTRACT)


solid = part.part
